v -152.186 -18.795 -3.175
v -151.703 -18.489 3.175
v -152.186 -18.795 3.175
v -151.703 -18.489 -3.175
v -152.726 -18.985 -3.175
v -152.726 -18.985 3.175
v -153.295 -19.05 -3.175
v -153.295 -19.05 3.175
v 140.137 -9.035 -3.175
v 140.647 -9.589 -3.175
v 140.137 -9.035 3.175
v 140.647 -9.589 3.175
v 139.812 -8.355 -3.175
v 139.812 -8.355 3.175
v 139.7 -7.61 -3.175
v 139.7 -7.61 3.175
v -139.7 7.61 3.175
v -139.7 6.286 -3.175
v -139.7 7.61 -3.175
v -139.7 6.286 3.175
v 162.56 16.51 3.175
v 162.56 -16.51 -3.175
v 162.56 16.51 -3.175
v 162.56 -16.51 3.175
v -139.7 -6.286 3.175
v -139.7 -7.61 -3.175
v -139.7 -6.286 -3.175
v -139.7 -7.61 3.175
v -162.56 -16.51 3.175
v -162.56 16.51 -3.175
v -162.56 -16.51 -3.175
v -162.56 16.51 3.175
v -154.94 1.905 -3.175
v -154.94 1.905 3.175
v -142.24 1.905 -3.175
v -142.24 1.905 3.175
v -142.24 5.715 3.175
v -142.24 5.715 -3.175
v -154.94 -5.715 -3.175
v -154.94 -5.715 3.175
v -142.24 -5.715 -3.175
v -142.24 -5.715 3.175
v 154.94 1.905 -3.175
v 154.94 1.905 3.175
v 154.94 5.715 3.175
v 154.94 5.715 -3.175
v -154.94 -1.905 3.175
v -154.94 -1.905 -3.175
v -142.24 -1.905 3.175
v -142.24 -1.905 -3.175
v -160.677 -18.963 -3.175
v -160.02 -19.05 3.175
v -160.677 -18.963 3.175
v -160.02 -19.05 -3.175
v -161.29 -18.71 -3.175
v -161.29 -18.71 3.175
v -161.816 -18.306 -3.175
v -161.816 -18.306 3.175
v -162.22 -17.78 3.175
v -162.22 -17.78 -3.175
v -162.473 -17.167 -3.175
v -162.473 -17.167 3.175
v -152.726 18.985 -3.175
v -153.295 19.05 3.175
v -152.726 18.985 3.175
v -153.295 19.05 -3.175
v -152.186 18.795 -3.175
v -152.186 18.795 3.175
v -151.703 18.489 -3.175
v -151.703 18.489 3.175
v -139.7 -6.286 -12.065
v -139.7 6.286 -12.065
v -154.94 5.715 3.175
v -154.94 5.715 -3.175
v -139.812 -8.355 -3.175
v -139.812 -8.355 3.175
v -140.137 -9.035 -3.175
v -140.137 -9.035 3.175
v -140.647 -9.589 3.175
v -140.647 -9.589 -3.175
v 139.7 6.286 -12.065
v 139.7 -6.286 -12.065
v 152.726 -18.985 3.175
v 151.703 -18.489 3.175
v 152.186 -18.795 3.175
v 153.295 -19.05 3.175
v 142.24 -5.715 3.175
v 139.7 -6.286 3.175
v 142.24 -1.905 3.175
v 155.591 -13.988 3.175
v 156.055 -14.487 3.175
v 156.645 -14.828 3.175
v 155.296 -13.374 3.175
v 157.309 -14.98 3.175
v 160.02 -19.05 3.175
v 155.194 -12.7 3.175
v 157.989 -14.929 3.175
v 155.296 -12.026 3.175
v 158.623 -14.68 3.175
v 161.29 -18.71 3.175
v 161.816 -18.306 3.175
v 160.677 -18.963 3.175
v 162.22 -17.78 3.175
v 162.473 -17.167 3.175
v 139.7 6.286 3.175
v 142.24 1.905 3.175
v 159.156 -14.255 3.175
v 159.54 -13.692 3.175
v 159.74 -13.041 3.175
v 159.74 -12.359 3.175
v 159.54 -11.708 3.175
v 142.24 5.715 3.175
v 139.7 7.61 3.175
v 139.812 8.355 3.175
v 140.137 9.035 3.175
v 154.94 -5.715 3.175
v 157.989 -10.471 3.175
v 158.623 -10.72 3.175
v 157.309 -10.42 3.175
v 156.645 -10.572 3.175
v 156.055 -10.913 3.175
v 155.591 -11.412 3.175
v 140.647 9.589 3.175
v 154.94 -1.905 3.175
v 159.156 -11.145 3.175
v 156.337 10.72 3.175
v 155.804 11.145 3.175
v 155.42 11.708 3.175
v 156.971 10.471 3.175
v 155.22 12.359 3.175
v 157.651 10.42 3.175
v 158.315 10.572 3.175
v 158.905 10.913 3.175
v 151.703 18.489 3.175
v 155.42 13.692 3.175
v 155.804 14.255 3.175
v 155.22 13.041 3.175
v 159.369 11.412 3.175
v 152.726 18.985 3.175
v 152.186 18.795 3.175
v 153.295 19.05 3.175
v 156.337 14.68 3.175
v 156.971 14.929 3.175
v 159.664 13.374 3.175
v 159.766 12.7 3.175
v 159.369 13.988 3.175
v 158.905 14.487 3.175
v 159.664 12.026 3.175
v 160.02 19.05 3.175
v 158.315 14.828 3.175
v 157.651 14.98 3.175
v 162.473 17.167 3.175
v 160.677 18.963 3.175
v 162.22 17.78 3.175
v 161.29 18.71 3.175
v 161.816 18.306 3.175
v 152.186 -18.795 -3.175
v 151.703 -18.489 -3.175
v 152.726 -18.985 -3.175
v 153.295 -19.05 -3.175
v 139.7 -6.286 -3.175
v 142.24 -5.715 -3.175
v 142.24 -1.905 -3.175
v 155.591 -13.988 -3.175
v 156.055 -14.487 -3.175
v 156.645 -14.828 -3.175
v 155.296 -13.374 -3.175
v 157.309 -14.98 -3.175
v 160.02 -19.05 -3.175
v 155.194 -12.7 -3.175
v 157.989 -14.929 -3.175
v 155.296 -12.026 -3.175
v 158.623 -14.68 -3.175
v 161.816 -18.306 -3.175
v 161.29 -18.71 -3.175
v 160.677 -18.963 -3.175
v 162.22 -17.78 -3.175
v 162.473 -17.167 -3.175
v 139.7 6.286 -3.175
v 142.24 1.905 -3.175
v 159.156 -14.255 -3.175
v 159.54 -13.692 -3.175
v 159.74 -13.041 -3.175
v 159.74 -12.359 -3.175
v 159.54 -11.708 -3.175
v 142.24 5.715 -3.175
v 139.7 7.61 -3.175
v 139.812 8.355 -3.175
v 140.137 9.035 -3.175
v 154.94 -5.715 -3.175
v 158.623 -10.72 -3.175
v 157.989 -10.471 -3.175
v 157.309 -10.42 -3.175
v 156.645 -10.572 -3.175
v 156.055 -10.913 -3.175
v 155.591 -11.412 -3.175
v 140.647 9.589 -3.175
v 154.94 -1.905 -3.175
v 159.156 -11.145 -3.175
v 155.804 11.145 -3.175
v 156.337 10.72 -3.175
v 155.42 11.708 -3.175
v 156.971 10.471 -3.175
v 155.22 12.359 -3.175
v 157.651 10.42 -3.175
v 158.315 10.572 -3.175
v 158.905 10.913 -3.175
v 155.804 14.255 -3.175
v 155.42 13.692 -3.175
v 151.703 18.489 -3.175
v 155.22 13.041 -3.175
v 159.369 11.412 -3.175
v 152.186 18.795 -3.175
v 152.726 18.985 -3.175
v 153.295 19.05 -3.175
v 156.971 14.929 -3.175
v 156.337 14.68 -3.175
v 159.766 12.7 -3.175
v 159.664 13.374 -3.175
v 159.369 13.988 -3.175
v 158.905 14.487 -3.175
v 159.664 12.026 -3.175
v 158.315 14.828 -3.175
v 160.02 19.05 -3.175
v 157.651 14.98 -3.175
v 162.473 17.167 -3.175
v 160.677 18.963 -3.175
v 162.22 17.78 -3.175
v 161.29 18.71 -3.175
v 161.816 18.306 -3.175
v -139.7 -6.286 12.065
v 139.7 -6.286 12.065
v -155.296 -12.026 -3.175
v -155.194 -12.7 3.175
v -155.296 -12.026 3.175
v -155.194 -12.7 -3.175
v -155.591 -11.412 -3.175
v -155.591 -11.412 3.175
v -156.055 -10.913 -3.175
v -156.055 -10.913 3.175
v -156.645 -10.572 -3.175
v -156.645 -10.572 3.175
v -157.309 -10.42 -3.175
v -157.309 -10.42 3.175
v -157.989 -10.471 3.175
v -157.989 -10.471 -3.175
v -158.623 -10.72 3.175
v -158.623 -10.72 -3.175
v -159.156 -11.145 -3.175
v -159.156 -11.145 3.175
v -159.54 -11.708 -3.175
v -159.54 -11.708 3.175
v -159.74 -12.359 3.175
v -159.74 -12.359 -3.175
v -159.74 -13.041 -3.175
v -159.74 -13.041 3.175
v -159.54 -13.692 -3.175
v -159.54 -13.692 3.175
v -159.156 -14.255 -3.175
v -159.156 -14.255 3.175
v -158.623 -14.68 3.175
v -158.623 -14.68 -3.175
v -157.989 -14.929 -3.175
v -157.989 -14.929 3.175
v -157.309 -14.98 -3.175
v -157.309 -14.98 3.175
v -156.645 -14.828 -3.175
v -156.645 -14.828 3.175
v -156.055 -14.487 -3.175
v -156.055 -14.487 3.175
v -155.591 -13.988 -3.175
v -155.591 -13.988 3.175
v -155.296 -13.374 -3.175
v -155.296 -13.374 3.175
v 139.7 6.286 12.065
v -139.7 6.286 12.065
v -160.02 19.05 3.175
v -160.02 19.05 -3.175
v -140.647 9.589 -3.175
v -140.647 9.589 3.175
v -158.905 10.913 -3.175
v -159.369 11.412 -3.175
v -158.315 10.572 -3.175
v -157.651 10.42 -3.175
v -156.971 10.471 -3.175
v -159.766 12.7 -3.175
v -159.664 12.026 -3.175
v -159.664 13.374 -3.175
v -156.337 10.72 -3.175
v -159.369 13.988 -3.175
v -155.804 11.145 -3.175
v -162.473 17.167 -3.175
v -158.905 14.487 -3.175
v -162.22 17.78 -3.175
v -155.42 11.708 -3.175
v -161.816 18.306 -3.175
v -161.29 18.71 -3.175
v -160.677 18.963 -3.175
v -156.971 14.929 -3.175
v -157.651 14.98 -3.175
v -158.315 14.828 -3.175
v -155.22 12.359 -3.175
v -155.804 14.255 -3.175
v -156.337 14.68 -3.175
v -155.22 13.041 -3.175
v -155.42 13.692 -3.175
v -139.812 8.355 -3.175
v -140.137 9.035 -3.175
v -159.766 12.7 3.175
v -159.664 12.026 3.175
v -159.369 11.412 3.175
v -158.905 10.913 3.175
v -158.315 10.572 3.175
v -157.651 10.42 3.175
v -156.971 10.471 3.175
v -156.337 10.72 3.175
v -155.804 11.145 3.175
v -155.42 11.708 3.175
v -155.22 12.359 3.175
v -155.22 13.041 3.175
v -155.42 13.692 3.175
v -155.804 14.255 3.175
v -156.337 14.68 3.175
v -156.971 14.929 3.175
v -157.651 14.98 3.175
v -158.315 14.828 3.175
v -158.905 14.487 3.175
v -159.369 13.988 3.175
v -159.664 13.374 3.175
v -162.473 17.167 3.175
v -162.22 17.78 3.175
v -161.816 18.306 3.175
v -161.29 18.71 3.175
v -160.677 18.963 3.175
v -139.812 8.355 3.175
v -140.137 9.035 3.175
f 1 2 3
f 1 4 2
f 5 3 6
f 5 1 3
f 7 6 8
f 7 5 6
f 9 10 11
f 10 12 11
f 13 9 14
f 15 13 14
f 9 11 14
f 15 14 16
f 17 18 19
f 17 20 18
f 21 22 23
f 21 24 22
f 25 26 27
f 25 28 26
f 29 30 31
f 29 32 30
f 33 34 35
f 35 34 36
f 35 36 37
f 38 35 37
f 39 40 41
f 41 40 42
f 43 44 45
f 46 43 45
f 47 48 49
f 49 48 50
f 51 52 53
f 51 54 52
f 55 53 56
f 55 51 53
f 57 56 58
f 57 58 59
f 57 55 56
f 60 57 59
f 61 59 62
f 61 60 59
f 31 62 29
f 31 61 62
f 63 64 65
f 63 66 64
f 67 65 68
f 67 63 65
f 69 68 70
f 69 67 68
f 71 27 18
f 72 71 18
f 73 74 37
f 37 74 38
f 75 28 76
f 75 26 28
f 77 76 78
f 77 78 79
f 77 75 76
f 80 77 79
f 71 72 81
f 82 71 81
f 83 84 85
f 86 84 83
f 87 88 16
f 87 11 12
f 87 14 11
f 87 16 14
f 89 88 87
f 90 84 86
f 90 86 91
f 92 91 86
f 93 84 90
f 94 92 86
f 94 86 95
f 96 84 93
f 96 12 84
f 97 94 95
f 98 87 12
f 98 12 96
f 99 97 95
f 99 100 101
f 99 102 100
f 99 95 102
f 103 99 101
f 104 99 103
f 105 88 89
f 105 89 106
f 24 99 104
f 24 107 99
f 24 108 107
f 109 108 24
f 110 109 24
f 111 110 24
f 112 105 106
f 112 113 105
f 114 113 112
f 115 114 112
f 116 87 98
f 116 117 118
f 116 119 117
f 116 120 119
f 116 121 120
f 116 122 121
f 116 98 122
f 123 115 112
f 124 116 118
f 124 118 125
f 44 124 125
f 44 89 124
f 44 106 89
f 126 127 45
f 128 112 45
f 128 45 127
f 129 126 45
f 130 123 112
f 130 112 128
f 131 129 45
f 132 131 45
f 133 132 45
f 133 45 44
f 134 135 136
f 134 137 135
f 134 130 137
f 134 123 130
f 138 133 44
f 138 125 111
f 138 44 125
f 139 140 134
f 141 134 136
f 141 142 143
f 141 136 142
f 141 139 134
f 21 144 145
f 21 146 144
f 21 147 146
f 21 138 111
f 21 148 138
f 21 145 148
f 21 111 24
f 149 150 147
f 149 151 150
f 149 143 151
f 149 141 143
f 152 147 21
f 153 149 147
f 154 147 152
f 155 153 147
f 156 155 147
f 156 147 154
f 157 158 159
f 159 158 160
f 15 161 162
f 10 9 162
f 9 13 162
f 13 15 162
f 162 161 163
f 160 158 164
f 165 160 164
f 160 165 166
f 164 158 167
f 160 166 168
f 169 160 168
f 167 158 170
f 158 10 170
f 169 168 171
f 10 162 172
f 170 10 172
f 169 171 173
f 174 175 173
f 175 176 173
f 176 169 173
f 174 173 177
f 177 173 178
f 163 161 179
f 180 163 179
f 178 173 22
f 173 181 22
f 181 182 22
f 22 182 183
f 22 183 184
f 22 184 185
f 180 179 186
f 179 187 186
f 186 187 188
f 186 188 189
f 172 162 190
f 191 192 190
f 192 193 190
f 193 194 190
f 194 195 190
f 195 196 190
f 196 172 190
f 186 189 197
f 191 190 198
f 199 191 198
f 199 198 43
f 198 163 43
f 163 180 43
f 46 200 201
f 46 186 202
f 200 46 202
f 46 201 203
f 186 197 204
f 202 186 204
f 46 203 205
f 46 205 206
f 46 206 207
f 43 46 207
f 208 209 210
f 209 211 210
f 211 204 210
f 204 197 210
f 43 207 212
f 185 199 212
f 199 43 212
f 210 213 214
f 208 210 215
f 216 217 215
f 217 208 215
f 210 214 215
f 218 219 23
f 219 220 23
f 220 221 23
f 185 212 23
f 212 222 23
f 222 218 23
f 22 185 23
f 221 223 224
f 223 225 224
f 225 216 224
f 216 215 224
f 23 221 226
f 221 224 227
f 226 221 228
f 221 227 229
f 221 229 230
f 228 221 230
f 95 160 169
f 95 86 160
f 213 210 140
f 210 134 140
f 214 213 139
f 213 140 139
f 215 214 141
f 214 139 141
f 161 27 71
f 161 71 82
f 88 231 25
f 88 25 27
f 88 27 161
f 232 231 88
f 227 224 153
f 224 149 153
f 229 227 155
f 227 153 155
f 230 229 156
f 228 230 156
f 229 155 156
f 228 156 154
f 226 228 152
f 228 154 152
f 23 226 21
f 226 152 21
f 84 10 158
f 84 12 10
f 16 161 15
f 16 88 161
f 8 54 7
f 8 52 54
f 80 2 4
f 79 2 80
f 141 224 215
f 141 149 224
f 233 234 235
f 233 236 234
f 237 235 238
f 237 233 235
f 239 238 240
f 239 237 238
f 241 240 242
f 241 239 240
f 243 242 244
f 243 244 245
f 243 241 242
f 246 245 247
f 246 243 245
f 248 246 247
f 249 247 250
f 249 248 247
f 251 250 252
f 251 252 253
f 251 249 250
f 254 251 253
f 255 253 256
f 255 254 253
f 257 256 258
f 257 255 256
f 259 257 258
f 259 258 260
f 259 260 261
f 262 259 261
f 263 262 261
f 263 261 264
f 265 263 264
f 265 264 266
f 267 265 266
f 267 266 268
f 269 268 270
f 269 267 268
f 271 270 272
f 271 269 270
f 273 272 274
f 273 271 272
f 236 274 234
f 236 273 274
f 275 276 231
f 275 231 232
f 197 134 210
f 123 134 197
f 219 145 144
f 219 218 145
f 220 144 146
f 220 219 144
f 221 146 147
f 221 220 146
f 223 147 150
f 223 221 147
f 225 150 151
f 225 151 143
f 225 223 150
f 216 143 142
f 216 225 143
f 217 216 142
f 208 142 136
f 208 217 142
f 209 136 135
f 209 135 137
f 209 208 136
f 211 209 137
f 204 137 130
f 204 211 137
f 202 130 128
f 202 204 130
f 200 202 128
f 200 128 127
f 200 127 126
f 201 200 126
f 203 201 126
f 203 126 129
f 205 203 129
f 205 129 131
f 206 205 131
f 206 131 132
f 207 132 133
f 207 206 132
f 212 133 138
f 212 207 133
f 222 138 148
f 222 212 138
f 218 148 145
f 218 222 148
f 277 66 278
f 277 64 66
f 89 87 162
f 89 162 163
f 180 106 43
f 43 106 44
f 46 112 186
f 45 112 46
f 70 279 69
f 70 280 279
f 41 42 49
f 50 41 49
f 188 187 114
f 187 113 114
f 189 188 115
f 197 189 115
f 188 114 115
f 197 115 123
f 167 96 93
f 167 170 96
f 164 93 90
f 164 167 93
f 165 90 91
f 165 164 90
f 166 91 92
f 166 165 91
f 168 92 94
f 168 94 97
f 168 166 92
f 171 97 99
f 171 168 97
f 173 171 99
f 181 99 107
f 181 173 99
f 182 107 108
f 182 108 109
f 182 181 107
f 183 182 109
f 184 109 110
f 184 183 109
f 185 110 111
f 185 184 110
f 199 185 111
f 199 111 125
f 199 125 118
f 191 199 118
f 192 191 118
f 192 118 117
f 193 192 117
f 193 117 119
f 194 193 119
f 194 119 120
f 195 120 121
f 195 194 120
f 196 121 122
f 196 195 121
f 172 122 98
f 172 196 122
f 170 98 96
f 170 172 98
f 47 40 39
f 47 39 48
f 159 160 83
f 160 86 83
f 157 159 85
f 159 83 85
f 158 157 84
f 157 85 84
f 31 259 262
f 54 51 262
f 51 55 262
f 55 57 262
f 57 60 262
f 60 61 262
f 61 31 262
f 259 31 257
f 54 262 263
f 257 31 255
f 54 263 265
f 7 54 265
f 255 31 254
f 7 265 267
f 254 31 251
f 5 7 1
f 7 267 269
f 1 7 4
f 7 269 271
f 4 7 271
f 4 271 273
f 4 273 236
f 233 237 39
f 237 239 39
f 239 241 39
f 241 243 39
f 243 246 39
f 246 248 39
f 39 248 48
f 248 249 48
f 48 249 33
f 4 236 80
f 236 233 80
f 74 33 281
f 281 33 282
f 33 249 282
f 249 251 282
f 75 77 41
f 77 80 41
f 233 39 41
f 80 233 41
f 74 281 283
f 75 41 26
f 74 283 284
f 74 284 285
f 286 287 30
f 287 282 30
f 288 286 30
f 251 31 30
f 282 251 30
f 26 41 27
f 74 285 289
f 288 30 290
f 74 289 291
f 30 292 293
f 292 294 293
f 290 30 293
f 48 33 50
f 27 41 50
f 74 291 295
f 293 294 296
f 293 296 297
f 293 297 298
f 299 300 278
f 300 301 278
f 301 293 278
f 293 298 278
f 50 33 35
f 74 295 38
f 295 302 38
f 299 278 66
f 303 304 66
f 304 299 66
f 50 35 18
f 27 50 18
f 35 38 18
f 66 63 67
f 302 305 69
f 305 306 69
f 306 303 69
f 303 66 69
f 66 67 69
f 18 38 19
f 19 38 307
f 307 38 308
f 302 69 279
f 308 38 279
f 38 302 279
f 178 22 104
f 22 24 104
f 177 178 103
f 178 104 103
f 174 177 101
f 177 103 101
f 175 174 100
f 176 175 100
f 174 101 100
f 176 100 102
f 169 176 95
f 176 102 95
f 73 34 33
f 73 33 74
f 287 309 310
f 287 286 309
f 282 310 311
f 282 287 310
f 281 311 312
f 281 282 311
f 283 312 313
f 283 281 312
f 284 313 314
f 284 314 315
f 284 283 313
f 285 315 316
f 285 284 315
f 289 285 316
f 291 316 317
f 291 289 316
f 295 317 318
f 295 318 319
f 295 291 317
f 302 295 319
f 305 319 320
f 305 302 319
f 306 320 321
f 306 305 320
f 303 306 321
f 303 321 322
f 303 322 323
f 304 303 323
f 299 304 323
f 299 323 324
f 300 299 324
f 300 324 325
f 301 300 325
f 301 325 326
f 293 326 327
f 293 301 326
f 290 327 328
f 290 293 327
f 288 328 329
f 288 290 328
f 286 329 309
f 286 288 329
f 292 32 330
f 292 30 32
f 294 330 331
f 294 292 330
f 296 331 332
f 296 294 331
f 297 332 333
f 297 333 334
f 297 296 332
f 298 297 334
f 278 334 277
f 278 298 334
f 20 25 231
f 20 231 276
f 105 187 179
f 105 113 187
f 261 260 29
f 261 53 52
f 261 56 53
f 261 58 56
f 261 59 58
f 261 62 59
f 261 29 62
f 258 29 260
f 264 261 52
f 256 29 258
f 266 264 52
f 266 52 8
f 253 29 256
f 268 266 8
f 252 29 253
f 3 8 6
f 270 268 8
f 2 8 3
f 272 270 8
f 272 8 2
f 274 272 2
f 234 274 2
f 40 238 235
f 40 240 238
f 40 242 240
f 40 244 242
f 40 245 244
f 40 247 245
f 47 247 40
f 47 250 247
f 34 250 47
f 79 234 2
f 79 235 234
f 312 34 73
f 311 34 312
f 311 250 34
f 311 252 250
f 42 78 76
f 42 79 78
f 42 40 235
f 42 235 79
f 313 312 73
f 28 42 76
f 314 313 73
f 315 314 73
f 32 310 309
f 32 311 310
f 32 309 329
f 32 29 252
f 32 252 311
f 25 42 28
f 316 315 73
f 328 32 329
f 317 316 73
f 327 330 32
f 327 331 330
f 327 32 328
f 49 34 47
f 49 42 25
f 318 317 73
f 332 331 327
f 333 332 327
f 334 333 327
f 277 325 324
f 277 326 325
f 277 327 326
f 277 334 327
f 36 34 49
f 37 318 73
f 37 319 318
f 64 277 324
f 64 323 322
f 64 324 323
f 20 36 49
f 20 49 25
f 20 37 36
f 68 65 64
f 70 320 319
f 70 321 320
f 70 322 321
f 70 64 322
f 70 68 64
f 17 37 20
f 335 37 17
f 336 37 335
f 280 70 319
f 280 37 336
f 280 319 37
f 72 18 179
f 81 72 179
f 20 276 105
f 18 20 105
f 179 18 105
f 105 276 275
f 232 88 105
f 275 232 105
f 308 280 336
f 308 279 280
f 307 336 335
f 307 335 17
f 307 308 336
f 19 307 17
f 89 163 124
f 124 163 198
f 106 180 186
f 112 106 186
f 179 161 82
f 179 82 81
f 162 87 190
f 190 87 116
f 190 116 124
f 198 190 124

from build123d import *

# Parameters (mm, degrees)
SKETCH1_R           = 2.286
SKETCH1_W           = 12.7
SKETCH1_H           = 3.81
BOSS_EXTRUDE1_DEPTH = 3.175
FILLET1_R           = 2.54
SKETCH3_W           = 279.4
SKETCH3_H           = 12.573
BOSS_EXTRUDE3_DEPTH = 8.89


with BuildPart() as part:
    # Sketch1 → Boss-Extrude1 (new, symmetric)
    with BuildSketch(Plane.XY):
        Polygon((-139.7, -6.2865), (139.7, -6.2865), (139.7, -8.8265), (152.4, -19.05), (162.56, -19.05), (162.56, 19.05), (152.4, 19.05), (139.7, 8.8265), (139.7, 6.2865), (-139.7, 6.2865), (-139.7, 8.8265), (-152.4, 19.05), (-162.56, 19.05), (-162.56, -19.05), (-152.4, -19.05), (-139.7, -8.8265), align=None)
        with Locations((-157.48, -12.7)):
            Circle(SKETCH1_R, mode=Mode.SUBTRACT)
        with Locations(Location((-157.48, 12.7, 0), (0, 0, 180))):
            Circle(SKETCH1_R, mode=Mode.SUBTRACT)
        with Locations((157.48, 12.7)):
            Circle(SKETCH1_R, mode=Mode.SUBTRACT)
        with Locations(Location((157.48, -12.7, 0), (0, 0, 180))):
            Circle(SKETCH1_R, mode=Mode.SUBTRACT)
        with Locations((-148.59, 3.81)):
            Rectangle(SKETCH1_W, SKETCH1_H, mode=Mode.SUBTRACT)
        with Locations((-148.59, -3.81)):
            Rectangle(SKETCH1_W, SKETCH1_H, mode=Mode.SUBTRACT)
        with Locations((148.59, -3.81)):
            Rectangle(SKETCH1_W, SKETCH1_H, mode=Mode.SUBTRACT)
        with Locations((148.59, 3.81)):
            Rectangle(SKETCH1_W, SKETCH1_H, mode=Mode.SUBTRACT)
    extrude(amount=BOSS_EXTRUDE1_DEPTH, both=True)

    # Fillet1
    fillet1_edges = [part.edges().sort_by_distance(p)[0] for p in [
        (-139.7, -8.8265, 0),
        (-152.4, -19.05, 0),
        (-162.56, -19.05, 0),
        (-162.56, 19.05, 0),
        (-152.4, 19.05, 0),
        (-139.7, 8.8265, 0),
        (139.7, 8.8265, 0),
        (152.4, 19.05, 0),
        (162.56, 19.05, 0),
        (162.56, -19.05, 0),
        (152.4, -19.05, 0),
        (139.7, -8.8265, 0),
    ]]
    fillet(fillet1_edges, radius=FILLET1_R)

    # Sketch3 → Boss-Extrude3 (add)
    with BuildSketch(Plane.XY.offset(3.175)):
        Rectangle(SKETCH3_W, SKETCH3_H)
    boss_extrude3 = extrude(amount=BOSS_EXTRUDE3_DEPTH)

    # Mirror1: Boss-Extrude3 across plane
    add(boss_extrude3.mirror(Plane.XY))


solid = part.part
